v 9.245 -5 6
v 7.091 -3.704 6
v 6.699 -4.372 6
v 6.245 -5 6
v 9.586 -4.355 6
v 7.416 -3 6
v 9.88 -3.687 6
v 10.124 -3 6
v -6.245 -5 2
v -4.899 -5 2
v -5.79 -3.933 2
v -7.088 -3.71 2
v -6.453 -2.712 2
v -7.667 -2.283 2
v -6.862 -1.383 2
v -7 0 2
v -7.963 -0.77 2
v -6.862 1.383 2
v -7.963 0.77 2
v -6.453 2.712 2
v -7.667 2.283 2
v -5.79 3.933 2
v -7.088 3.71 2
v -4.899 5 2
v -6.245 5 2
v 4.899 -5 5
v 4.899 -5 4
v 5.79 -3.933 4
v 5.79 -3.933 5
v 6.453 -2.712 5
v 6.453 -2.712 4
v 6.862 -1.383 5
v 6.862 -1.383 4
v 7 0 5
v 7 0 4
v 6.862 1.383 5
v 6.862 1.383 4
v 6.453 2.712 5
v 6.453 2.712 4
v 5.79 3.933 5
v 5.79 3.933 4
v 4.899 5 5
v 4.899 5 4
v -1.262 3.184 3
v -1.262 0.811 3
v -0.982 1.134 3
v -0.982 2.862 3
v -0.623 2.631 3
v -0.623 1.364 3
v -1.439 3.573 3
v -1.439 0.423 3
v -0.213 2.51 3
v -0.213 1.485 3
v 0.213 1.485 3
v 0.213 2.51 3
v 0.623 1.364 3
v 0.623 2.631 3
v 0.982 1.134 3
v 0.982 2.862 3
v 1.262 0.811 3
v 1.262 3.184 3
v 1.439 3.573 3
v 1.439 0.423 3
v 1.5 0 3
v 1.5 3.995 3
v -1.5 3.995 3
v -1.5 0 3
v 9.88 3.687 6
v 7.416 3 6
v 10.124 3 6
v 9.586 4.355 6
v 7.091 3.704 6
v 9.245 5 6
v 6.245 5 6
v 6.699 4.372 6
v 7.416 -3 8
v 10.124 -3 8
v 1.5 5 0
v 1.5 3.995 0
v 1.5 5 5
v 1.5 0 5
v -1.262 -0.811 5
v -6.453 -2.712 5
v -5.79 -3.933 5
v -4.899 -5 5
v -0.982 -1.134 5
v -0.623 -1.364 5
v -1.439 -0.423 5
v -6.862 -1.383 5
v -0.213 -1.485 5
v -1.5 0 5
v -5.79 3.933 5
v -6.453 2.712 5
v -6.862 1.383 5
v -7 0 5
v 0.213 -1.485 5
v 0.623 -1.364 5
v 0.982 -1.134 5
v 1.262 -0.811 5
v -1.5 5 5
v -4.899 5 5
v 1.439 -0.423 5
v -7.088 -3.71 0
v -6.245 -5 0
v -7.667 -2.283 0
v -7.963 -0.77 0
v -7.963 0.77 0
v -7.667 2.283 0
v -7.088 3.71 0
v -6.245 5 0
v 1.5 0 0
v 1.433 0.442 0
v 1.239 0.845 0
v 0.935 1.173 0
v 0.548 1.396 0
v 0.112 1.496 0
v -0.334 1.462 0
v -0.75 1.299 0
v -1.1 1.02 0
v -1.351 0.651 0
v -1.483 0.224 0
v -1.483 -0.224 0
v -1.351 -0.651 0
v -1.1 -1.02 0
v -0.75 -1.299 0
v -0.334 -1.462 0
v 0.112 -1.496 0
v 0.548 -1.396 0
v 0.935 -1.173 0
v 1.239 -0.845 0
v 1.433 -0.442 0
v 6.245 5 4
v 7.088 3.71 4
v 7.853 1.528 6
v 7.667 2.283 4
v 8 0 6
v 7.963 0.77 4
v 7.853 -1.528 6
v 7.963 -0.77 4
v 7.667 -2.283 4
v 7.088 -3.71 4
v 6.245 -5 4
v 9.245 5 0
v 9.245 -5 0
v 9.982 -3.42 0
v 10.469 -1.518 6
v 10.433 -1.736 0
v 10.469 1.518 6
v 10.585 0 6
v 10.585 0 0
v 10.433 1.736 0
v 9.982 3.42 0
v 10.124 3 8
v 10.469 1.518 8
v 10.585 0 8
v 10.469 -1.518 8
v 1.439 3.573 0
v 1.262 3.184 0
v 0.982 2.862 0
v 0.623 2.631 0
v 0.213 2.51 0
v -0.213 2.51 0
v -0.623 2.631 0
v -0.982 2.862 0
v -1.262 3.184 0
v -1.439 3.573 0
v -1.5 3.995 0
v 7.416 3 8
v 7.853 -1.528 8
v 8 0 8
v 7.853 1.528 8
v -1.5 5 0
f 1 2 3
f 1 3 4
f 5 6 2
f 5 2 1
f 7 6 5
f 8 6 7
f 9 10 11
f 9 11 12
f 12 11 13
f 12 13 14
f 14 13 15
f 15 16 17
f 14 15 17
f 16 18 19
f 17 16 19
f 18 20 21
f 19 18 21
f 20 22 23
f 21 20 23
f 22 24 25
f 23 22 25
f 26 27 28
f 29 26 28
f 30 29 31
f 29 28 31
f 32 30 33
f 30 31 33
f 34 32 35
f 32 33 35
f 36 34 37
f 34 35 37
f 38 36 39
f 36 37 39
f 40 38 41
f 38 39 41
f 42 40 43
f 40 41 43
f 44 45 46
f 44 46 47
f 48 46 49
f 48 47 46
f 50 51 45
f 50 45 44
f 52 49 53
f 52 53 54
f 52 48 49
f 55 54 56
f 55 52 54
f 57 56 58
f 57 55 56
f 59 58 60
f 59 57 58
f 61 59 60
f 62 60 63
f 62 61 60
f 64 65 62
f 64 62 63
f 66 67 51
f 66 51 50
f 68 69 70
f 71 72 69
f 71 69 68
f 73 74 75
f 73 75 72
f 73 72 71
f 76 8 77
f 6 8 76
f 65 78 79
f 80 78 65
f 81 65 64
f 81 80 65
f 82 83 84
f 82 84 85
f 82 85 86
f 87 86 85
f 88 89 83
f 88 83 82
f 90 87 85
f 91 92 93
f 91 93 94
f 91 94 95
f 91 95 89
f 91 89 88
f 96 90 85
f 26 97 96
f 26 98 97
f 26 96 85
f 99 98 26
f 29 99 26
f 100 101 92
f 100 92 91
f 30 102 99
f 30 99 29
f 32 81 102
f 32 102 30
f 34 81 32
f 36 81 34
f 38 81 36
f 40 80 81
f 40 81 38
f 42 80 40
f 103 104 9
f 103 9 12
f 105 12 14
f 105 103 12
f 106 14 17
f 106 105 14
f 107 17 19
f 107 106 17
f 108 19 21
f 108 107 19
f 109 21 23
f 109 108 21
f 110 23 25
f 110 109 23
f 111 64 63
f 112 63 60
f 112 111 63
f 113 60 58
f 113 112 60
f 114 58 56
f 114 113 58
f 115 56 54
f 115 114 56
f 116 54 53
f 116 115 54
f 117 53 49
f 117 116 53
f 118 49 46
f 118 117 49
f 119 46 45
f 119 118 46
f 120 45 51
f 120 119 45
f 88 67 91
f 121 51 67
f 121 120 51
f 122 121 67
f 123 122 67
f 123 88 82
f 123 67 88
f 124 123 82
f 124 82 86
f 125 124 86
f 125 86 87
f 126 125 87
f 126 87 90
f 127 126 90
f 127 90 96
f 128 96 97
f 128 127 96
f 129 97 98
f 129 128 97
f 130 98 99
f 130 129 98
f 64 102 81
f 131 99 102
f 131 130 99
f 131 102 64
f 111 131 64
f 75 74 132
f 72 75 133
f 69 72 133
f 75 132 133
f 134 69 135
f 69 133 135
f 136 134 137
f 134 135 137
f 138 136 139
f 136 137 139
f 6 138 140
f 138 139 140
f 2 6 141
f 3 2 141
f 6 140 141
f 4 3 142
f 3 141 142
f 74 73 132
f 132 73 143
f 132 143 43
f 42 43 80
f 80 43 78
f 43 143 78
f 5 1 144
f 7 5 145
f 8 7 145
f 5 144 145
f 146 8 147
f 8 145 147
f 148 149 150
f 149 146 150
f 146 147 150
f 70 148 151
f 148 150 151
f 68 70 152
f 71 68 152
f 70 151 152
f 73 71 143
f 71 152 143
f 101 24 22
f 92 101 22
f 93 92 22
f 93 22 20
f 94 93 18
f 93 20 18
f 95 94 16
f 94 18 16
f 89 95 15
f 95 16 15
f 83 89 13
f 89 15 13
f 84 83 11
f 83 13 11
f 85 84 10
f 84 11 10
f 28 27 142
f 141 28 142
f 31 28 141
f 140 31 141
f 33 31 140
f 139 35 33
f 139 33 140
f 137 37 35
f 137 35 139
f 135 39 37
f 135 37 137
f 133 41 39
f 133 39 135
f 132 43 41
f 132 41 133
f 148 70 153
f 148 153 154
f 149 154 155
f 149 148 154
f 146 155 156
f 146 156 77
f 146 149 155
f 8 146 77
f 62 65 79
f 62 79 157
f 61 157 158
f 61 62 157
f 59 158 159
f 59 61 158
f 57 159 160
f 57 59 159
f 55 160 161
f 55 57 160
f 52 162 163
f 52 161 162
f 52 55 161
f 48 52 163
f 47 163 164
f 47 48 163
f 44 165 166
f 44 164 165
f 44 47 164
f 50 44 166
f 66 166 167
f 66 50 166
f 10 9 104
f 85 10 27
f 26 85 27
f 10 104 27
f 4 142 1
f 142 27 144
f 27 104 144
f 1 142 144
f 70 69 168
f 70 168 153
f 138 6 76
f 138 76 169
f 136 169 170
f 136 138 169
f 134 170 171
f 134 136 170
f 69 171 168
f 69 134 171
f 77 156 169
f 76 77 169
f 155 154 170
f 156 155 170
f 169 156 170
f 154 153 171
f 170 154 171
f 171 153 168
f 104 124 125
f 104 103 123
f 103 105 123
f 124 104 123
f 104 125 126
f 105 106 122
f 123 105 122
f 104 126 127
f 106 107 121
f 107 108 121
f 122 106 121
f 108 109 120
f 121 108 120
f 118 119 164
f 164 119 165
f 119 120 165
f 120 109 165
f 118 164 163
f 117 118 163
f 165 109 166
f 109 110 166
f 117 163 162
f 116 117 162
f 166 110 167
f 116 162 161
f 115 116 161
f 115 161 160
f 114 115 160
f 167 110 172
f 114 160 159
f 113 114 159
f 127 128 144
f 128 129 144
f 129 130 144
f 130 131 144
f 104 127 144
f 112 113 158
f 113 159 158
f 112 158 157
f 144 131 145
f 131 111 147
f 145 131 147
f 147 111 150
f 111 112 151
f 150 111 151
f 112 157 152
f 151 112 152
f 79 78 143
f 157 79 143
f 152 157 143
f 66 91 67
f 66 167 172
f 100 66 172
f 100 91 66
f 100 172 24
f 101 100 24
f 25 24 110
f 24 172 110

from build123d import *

# Parameters (mm, degrees)
SKETCH1_R           = 1.5
BOSS_EXTRUDE1_DEPTH = 2
SKETCH2_R           = 1.5
BOSS_EXTRUDE2_DEPTH = 3
BOSS_EXTRUDE3_DEPTH = 6
BOSS_EXTRUDE4_DEPTH = 2
CUT_EXTRUDE1_DEPTH  = 2
CUT_EXTRUDE2_DEPTH  = 4
BOSS_EXTRUDE5_DEPTH = 2


with BuildPart() as part:
    # Sketch1 → Boss-Extrude1 (new body)
    with BuildSketch(Plane.XY):
        with BuildLine():
            Line((-6.244997998, 5), (6.244997998, 5))
            ThreePointArc((6.244997998, 5), (8, 0), (6.244997998, -5))
            Line((6.244997998, -5), (-6.244997998, -5))
            ThreePointArc((-6.244997998, -5), (-8, 0), (-6.244997998, 5))
        make_face()
        Circle(SKETCH1_R, mode=Mode.SUBTRACT)
    extrude(amount=BOSS_EXTRUDE1_DEPTH)

    # Sketch2 → Boss-Extrude2 (add)
    with BuildSketch(Plane.XY.offset(2)):
        with BuildLine():
            Line((-4.898979486, -5), (4.898979486, -5))
            ThreePointArc((4.898979486, -5), (7, 0), (4.898979486, 5))
            Line((4.898979486, 5), (-4.898979486, 5))
            ThreePointArc((-4.898979486, 5), (-7, 0), (-4.898979486, -5))
        make_face()
        Circle(SKETCH2_R, mode=Mode.SUBTRACT)
    extrude(amount=BOSS_EXTRUDE2_DEPTH)

    # Sketch3 → Boss-Extrude3 (add)
    with BuildSketch(Plane(origin=(0, 0, 0), x_dir=(-1, 0, 0), z_dir=(0, 0, -1))):
        with BuildLine():
            Line((-6.244997998, -5), (-9.244997998, -5))
            ThreePointArc((-9.244997998, -5), (-10.584743961, 0), (-9.244997998, 5))
            Line((-9.244997998, 5), (-6.244997998, 5))
            ThreePointArc((-6.244997998, 5), (-8, 0), (-6.244997998, -5))
        make_face()
    extrude(amount=-BOSS_EXTRUDE3_DEPTH)

    # Sketch4 → Boss-Extrude4 (add)
    with BuildSketch(Plane.XY.offset(6)):
        with BuildLine():
            Line((7.416198487, 3), (10.124135975, 3))
            ThreePointArc((10.124135975, 3), (10.584743961, 0), (10.124135975, -3))
            Line((10.124135975, -3), (7.416198487, -3))
            ThreePointArc((7.416198487, -3), (8, 0), (7.416198487, 3))
        make_face()
    extrude(amount=BOSS_EXTRUDE4_DEPTH)

    # Sketch5 → Cut-Extrude1 (cut)
    with BuildSketch(Plane.XY.offset(5)):
        with BuildLine():
            Line((-1.5, 5), (-1.5, 0))
            ThreePointArc((-1.5, 0), (-4.1e-08, -1.5), (1.5, -8.1e-08))
            Line((1.5, -8.1e-08), (1.5, 5))
            Line((1.5, 5), (-1.5, 5))
        make_face()
    extrude(amount=-CUT_EXTRUDE1_DEPTH, mode=Mode.SUBTRACT)

    # Sketch6 → Cut-Extrude2 (cut)
    with BuildSketch(Plane.XY.offset(3)):
        with BuildLine():
            Line((-1.5, 5), (1.5, 5))
            Line((1.5, 5), (1.5, 3.995198361))
            ThreePointArc((1.5, 3.995198361), (0, 2.495198361), (-1.5, 3.995198361))
            Line((-1.5, 3.995198361), (-1.5, 5))
        make_face()
    extrude(amount=-CUT_EXTRUDE2_DEPTH, mode=Mode.SUBTRACT)

    # Sketch7 → Boss-Extrude5 (add)
    with BuildSketch(Plane.XY.offset(2)):
        with BuildLine():
            Line((4.898979486, -5), (6.244997998, -5))
            ThreePointArc((6.244997998, -5), (8, 0), (6.244997998, 5))
            Line((6.244997998, 5), (4.898979486, 5))
            ThreePointArc((4.898979486, 5), (7, 0), (4.898979486, -5))
        make_face()
    extrude(amount=BOSS_EXTRUDE5_DEPTH)


solid = part.part
